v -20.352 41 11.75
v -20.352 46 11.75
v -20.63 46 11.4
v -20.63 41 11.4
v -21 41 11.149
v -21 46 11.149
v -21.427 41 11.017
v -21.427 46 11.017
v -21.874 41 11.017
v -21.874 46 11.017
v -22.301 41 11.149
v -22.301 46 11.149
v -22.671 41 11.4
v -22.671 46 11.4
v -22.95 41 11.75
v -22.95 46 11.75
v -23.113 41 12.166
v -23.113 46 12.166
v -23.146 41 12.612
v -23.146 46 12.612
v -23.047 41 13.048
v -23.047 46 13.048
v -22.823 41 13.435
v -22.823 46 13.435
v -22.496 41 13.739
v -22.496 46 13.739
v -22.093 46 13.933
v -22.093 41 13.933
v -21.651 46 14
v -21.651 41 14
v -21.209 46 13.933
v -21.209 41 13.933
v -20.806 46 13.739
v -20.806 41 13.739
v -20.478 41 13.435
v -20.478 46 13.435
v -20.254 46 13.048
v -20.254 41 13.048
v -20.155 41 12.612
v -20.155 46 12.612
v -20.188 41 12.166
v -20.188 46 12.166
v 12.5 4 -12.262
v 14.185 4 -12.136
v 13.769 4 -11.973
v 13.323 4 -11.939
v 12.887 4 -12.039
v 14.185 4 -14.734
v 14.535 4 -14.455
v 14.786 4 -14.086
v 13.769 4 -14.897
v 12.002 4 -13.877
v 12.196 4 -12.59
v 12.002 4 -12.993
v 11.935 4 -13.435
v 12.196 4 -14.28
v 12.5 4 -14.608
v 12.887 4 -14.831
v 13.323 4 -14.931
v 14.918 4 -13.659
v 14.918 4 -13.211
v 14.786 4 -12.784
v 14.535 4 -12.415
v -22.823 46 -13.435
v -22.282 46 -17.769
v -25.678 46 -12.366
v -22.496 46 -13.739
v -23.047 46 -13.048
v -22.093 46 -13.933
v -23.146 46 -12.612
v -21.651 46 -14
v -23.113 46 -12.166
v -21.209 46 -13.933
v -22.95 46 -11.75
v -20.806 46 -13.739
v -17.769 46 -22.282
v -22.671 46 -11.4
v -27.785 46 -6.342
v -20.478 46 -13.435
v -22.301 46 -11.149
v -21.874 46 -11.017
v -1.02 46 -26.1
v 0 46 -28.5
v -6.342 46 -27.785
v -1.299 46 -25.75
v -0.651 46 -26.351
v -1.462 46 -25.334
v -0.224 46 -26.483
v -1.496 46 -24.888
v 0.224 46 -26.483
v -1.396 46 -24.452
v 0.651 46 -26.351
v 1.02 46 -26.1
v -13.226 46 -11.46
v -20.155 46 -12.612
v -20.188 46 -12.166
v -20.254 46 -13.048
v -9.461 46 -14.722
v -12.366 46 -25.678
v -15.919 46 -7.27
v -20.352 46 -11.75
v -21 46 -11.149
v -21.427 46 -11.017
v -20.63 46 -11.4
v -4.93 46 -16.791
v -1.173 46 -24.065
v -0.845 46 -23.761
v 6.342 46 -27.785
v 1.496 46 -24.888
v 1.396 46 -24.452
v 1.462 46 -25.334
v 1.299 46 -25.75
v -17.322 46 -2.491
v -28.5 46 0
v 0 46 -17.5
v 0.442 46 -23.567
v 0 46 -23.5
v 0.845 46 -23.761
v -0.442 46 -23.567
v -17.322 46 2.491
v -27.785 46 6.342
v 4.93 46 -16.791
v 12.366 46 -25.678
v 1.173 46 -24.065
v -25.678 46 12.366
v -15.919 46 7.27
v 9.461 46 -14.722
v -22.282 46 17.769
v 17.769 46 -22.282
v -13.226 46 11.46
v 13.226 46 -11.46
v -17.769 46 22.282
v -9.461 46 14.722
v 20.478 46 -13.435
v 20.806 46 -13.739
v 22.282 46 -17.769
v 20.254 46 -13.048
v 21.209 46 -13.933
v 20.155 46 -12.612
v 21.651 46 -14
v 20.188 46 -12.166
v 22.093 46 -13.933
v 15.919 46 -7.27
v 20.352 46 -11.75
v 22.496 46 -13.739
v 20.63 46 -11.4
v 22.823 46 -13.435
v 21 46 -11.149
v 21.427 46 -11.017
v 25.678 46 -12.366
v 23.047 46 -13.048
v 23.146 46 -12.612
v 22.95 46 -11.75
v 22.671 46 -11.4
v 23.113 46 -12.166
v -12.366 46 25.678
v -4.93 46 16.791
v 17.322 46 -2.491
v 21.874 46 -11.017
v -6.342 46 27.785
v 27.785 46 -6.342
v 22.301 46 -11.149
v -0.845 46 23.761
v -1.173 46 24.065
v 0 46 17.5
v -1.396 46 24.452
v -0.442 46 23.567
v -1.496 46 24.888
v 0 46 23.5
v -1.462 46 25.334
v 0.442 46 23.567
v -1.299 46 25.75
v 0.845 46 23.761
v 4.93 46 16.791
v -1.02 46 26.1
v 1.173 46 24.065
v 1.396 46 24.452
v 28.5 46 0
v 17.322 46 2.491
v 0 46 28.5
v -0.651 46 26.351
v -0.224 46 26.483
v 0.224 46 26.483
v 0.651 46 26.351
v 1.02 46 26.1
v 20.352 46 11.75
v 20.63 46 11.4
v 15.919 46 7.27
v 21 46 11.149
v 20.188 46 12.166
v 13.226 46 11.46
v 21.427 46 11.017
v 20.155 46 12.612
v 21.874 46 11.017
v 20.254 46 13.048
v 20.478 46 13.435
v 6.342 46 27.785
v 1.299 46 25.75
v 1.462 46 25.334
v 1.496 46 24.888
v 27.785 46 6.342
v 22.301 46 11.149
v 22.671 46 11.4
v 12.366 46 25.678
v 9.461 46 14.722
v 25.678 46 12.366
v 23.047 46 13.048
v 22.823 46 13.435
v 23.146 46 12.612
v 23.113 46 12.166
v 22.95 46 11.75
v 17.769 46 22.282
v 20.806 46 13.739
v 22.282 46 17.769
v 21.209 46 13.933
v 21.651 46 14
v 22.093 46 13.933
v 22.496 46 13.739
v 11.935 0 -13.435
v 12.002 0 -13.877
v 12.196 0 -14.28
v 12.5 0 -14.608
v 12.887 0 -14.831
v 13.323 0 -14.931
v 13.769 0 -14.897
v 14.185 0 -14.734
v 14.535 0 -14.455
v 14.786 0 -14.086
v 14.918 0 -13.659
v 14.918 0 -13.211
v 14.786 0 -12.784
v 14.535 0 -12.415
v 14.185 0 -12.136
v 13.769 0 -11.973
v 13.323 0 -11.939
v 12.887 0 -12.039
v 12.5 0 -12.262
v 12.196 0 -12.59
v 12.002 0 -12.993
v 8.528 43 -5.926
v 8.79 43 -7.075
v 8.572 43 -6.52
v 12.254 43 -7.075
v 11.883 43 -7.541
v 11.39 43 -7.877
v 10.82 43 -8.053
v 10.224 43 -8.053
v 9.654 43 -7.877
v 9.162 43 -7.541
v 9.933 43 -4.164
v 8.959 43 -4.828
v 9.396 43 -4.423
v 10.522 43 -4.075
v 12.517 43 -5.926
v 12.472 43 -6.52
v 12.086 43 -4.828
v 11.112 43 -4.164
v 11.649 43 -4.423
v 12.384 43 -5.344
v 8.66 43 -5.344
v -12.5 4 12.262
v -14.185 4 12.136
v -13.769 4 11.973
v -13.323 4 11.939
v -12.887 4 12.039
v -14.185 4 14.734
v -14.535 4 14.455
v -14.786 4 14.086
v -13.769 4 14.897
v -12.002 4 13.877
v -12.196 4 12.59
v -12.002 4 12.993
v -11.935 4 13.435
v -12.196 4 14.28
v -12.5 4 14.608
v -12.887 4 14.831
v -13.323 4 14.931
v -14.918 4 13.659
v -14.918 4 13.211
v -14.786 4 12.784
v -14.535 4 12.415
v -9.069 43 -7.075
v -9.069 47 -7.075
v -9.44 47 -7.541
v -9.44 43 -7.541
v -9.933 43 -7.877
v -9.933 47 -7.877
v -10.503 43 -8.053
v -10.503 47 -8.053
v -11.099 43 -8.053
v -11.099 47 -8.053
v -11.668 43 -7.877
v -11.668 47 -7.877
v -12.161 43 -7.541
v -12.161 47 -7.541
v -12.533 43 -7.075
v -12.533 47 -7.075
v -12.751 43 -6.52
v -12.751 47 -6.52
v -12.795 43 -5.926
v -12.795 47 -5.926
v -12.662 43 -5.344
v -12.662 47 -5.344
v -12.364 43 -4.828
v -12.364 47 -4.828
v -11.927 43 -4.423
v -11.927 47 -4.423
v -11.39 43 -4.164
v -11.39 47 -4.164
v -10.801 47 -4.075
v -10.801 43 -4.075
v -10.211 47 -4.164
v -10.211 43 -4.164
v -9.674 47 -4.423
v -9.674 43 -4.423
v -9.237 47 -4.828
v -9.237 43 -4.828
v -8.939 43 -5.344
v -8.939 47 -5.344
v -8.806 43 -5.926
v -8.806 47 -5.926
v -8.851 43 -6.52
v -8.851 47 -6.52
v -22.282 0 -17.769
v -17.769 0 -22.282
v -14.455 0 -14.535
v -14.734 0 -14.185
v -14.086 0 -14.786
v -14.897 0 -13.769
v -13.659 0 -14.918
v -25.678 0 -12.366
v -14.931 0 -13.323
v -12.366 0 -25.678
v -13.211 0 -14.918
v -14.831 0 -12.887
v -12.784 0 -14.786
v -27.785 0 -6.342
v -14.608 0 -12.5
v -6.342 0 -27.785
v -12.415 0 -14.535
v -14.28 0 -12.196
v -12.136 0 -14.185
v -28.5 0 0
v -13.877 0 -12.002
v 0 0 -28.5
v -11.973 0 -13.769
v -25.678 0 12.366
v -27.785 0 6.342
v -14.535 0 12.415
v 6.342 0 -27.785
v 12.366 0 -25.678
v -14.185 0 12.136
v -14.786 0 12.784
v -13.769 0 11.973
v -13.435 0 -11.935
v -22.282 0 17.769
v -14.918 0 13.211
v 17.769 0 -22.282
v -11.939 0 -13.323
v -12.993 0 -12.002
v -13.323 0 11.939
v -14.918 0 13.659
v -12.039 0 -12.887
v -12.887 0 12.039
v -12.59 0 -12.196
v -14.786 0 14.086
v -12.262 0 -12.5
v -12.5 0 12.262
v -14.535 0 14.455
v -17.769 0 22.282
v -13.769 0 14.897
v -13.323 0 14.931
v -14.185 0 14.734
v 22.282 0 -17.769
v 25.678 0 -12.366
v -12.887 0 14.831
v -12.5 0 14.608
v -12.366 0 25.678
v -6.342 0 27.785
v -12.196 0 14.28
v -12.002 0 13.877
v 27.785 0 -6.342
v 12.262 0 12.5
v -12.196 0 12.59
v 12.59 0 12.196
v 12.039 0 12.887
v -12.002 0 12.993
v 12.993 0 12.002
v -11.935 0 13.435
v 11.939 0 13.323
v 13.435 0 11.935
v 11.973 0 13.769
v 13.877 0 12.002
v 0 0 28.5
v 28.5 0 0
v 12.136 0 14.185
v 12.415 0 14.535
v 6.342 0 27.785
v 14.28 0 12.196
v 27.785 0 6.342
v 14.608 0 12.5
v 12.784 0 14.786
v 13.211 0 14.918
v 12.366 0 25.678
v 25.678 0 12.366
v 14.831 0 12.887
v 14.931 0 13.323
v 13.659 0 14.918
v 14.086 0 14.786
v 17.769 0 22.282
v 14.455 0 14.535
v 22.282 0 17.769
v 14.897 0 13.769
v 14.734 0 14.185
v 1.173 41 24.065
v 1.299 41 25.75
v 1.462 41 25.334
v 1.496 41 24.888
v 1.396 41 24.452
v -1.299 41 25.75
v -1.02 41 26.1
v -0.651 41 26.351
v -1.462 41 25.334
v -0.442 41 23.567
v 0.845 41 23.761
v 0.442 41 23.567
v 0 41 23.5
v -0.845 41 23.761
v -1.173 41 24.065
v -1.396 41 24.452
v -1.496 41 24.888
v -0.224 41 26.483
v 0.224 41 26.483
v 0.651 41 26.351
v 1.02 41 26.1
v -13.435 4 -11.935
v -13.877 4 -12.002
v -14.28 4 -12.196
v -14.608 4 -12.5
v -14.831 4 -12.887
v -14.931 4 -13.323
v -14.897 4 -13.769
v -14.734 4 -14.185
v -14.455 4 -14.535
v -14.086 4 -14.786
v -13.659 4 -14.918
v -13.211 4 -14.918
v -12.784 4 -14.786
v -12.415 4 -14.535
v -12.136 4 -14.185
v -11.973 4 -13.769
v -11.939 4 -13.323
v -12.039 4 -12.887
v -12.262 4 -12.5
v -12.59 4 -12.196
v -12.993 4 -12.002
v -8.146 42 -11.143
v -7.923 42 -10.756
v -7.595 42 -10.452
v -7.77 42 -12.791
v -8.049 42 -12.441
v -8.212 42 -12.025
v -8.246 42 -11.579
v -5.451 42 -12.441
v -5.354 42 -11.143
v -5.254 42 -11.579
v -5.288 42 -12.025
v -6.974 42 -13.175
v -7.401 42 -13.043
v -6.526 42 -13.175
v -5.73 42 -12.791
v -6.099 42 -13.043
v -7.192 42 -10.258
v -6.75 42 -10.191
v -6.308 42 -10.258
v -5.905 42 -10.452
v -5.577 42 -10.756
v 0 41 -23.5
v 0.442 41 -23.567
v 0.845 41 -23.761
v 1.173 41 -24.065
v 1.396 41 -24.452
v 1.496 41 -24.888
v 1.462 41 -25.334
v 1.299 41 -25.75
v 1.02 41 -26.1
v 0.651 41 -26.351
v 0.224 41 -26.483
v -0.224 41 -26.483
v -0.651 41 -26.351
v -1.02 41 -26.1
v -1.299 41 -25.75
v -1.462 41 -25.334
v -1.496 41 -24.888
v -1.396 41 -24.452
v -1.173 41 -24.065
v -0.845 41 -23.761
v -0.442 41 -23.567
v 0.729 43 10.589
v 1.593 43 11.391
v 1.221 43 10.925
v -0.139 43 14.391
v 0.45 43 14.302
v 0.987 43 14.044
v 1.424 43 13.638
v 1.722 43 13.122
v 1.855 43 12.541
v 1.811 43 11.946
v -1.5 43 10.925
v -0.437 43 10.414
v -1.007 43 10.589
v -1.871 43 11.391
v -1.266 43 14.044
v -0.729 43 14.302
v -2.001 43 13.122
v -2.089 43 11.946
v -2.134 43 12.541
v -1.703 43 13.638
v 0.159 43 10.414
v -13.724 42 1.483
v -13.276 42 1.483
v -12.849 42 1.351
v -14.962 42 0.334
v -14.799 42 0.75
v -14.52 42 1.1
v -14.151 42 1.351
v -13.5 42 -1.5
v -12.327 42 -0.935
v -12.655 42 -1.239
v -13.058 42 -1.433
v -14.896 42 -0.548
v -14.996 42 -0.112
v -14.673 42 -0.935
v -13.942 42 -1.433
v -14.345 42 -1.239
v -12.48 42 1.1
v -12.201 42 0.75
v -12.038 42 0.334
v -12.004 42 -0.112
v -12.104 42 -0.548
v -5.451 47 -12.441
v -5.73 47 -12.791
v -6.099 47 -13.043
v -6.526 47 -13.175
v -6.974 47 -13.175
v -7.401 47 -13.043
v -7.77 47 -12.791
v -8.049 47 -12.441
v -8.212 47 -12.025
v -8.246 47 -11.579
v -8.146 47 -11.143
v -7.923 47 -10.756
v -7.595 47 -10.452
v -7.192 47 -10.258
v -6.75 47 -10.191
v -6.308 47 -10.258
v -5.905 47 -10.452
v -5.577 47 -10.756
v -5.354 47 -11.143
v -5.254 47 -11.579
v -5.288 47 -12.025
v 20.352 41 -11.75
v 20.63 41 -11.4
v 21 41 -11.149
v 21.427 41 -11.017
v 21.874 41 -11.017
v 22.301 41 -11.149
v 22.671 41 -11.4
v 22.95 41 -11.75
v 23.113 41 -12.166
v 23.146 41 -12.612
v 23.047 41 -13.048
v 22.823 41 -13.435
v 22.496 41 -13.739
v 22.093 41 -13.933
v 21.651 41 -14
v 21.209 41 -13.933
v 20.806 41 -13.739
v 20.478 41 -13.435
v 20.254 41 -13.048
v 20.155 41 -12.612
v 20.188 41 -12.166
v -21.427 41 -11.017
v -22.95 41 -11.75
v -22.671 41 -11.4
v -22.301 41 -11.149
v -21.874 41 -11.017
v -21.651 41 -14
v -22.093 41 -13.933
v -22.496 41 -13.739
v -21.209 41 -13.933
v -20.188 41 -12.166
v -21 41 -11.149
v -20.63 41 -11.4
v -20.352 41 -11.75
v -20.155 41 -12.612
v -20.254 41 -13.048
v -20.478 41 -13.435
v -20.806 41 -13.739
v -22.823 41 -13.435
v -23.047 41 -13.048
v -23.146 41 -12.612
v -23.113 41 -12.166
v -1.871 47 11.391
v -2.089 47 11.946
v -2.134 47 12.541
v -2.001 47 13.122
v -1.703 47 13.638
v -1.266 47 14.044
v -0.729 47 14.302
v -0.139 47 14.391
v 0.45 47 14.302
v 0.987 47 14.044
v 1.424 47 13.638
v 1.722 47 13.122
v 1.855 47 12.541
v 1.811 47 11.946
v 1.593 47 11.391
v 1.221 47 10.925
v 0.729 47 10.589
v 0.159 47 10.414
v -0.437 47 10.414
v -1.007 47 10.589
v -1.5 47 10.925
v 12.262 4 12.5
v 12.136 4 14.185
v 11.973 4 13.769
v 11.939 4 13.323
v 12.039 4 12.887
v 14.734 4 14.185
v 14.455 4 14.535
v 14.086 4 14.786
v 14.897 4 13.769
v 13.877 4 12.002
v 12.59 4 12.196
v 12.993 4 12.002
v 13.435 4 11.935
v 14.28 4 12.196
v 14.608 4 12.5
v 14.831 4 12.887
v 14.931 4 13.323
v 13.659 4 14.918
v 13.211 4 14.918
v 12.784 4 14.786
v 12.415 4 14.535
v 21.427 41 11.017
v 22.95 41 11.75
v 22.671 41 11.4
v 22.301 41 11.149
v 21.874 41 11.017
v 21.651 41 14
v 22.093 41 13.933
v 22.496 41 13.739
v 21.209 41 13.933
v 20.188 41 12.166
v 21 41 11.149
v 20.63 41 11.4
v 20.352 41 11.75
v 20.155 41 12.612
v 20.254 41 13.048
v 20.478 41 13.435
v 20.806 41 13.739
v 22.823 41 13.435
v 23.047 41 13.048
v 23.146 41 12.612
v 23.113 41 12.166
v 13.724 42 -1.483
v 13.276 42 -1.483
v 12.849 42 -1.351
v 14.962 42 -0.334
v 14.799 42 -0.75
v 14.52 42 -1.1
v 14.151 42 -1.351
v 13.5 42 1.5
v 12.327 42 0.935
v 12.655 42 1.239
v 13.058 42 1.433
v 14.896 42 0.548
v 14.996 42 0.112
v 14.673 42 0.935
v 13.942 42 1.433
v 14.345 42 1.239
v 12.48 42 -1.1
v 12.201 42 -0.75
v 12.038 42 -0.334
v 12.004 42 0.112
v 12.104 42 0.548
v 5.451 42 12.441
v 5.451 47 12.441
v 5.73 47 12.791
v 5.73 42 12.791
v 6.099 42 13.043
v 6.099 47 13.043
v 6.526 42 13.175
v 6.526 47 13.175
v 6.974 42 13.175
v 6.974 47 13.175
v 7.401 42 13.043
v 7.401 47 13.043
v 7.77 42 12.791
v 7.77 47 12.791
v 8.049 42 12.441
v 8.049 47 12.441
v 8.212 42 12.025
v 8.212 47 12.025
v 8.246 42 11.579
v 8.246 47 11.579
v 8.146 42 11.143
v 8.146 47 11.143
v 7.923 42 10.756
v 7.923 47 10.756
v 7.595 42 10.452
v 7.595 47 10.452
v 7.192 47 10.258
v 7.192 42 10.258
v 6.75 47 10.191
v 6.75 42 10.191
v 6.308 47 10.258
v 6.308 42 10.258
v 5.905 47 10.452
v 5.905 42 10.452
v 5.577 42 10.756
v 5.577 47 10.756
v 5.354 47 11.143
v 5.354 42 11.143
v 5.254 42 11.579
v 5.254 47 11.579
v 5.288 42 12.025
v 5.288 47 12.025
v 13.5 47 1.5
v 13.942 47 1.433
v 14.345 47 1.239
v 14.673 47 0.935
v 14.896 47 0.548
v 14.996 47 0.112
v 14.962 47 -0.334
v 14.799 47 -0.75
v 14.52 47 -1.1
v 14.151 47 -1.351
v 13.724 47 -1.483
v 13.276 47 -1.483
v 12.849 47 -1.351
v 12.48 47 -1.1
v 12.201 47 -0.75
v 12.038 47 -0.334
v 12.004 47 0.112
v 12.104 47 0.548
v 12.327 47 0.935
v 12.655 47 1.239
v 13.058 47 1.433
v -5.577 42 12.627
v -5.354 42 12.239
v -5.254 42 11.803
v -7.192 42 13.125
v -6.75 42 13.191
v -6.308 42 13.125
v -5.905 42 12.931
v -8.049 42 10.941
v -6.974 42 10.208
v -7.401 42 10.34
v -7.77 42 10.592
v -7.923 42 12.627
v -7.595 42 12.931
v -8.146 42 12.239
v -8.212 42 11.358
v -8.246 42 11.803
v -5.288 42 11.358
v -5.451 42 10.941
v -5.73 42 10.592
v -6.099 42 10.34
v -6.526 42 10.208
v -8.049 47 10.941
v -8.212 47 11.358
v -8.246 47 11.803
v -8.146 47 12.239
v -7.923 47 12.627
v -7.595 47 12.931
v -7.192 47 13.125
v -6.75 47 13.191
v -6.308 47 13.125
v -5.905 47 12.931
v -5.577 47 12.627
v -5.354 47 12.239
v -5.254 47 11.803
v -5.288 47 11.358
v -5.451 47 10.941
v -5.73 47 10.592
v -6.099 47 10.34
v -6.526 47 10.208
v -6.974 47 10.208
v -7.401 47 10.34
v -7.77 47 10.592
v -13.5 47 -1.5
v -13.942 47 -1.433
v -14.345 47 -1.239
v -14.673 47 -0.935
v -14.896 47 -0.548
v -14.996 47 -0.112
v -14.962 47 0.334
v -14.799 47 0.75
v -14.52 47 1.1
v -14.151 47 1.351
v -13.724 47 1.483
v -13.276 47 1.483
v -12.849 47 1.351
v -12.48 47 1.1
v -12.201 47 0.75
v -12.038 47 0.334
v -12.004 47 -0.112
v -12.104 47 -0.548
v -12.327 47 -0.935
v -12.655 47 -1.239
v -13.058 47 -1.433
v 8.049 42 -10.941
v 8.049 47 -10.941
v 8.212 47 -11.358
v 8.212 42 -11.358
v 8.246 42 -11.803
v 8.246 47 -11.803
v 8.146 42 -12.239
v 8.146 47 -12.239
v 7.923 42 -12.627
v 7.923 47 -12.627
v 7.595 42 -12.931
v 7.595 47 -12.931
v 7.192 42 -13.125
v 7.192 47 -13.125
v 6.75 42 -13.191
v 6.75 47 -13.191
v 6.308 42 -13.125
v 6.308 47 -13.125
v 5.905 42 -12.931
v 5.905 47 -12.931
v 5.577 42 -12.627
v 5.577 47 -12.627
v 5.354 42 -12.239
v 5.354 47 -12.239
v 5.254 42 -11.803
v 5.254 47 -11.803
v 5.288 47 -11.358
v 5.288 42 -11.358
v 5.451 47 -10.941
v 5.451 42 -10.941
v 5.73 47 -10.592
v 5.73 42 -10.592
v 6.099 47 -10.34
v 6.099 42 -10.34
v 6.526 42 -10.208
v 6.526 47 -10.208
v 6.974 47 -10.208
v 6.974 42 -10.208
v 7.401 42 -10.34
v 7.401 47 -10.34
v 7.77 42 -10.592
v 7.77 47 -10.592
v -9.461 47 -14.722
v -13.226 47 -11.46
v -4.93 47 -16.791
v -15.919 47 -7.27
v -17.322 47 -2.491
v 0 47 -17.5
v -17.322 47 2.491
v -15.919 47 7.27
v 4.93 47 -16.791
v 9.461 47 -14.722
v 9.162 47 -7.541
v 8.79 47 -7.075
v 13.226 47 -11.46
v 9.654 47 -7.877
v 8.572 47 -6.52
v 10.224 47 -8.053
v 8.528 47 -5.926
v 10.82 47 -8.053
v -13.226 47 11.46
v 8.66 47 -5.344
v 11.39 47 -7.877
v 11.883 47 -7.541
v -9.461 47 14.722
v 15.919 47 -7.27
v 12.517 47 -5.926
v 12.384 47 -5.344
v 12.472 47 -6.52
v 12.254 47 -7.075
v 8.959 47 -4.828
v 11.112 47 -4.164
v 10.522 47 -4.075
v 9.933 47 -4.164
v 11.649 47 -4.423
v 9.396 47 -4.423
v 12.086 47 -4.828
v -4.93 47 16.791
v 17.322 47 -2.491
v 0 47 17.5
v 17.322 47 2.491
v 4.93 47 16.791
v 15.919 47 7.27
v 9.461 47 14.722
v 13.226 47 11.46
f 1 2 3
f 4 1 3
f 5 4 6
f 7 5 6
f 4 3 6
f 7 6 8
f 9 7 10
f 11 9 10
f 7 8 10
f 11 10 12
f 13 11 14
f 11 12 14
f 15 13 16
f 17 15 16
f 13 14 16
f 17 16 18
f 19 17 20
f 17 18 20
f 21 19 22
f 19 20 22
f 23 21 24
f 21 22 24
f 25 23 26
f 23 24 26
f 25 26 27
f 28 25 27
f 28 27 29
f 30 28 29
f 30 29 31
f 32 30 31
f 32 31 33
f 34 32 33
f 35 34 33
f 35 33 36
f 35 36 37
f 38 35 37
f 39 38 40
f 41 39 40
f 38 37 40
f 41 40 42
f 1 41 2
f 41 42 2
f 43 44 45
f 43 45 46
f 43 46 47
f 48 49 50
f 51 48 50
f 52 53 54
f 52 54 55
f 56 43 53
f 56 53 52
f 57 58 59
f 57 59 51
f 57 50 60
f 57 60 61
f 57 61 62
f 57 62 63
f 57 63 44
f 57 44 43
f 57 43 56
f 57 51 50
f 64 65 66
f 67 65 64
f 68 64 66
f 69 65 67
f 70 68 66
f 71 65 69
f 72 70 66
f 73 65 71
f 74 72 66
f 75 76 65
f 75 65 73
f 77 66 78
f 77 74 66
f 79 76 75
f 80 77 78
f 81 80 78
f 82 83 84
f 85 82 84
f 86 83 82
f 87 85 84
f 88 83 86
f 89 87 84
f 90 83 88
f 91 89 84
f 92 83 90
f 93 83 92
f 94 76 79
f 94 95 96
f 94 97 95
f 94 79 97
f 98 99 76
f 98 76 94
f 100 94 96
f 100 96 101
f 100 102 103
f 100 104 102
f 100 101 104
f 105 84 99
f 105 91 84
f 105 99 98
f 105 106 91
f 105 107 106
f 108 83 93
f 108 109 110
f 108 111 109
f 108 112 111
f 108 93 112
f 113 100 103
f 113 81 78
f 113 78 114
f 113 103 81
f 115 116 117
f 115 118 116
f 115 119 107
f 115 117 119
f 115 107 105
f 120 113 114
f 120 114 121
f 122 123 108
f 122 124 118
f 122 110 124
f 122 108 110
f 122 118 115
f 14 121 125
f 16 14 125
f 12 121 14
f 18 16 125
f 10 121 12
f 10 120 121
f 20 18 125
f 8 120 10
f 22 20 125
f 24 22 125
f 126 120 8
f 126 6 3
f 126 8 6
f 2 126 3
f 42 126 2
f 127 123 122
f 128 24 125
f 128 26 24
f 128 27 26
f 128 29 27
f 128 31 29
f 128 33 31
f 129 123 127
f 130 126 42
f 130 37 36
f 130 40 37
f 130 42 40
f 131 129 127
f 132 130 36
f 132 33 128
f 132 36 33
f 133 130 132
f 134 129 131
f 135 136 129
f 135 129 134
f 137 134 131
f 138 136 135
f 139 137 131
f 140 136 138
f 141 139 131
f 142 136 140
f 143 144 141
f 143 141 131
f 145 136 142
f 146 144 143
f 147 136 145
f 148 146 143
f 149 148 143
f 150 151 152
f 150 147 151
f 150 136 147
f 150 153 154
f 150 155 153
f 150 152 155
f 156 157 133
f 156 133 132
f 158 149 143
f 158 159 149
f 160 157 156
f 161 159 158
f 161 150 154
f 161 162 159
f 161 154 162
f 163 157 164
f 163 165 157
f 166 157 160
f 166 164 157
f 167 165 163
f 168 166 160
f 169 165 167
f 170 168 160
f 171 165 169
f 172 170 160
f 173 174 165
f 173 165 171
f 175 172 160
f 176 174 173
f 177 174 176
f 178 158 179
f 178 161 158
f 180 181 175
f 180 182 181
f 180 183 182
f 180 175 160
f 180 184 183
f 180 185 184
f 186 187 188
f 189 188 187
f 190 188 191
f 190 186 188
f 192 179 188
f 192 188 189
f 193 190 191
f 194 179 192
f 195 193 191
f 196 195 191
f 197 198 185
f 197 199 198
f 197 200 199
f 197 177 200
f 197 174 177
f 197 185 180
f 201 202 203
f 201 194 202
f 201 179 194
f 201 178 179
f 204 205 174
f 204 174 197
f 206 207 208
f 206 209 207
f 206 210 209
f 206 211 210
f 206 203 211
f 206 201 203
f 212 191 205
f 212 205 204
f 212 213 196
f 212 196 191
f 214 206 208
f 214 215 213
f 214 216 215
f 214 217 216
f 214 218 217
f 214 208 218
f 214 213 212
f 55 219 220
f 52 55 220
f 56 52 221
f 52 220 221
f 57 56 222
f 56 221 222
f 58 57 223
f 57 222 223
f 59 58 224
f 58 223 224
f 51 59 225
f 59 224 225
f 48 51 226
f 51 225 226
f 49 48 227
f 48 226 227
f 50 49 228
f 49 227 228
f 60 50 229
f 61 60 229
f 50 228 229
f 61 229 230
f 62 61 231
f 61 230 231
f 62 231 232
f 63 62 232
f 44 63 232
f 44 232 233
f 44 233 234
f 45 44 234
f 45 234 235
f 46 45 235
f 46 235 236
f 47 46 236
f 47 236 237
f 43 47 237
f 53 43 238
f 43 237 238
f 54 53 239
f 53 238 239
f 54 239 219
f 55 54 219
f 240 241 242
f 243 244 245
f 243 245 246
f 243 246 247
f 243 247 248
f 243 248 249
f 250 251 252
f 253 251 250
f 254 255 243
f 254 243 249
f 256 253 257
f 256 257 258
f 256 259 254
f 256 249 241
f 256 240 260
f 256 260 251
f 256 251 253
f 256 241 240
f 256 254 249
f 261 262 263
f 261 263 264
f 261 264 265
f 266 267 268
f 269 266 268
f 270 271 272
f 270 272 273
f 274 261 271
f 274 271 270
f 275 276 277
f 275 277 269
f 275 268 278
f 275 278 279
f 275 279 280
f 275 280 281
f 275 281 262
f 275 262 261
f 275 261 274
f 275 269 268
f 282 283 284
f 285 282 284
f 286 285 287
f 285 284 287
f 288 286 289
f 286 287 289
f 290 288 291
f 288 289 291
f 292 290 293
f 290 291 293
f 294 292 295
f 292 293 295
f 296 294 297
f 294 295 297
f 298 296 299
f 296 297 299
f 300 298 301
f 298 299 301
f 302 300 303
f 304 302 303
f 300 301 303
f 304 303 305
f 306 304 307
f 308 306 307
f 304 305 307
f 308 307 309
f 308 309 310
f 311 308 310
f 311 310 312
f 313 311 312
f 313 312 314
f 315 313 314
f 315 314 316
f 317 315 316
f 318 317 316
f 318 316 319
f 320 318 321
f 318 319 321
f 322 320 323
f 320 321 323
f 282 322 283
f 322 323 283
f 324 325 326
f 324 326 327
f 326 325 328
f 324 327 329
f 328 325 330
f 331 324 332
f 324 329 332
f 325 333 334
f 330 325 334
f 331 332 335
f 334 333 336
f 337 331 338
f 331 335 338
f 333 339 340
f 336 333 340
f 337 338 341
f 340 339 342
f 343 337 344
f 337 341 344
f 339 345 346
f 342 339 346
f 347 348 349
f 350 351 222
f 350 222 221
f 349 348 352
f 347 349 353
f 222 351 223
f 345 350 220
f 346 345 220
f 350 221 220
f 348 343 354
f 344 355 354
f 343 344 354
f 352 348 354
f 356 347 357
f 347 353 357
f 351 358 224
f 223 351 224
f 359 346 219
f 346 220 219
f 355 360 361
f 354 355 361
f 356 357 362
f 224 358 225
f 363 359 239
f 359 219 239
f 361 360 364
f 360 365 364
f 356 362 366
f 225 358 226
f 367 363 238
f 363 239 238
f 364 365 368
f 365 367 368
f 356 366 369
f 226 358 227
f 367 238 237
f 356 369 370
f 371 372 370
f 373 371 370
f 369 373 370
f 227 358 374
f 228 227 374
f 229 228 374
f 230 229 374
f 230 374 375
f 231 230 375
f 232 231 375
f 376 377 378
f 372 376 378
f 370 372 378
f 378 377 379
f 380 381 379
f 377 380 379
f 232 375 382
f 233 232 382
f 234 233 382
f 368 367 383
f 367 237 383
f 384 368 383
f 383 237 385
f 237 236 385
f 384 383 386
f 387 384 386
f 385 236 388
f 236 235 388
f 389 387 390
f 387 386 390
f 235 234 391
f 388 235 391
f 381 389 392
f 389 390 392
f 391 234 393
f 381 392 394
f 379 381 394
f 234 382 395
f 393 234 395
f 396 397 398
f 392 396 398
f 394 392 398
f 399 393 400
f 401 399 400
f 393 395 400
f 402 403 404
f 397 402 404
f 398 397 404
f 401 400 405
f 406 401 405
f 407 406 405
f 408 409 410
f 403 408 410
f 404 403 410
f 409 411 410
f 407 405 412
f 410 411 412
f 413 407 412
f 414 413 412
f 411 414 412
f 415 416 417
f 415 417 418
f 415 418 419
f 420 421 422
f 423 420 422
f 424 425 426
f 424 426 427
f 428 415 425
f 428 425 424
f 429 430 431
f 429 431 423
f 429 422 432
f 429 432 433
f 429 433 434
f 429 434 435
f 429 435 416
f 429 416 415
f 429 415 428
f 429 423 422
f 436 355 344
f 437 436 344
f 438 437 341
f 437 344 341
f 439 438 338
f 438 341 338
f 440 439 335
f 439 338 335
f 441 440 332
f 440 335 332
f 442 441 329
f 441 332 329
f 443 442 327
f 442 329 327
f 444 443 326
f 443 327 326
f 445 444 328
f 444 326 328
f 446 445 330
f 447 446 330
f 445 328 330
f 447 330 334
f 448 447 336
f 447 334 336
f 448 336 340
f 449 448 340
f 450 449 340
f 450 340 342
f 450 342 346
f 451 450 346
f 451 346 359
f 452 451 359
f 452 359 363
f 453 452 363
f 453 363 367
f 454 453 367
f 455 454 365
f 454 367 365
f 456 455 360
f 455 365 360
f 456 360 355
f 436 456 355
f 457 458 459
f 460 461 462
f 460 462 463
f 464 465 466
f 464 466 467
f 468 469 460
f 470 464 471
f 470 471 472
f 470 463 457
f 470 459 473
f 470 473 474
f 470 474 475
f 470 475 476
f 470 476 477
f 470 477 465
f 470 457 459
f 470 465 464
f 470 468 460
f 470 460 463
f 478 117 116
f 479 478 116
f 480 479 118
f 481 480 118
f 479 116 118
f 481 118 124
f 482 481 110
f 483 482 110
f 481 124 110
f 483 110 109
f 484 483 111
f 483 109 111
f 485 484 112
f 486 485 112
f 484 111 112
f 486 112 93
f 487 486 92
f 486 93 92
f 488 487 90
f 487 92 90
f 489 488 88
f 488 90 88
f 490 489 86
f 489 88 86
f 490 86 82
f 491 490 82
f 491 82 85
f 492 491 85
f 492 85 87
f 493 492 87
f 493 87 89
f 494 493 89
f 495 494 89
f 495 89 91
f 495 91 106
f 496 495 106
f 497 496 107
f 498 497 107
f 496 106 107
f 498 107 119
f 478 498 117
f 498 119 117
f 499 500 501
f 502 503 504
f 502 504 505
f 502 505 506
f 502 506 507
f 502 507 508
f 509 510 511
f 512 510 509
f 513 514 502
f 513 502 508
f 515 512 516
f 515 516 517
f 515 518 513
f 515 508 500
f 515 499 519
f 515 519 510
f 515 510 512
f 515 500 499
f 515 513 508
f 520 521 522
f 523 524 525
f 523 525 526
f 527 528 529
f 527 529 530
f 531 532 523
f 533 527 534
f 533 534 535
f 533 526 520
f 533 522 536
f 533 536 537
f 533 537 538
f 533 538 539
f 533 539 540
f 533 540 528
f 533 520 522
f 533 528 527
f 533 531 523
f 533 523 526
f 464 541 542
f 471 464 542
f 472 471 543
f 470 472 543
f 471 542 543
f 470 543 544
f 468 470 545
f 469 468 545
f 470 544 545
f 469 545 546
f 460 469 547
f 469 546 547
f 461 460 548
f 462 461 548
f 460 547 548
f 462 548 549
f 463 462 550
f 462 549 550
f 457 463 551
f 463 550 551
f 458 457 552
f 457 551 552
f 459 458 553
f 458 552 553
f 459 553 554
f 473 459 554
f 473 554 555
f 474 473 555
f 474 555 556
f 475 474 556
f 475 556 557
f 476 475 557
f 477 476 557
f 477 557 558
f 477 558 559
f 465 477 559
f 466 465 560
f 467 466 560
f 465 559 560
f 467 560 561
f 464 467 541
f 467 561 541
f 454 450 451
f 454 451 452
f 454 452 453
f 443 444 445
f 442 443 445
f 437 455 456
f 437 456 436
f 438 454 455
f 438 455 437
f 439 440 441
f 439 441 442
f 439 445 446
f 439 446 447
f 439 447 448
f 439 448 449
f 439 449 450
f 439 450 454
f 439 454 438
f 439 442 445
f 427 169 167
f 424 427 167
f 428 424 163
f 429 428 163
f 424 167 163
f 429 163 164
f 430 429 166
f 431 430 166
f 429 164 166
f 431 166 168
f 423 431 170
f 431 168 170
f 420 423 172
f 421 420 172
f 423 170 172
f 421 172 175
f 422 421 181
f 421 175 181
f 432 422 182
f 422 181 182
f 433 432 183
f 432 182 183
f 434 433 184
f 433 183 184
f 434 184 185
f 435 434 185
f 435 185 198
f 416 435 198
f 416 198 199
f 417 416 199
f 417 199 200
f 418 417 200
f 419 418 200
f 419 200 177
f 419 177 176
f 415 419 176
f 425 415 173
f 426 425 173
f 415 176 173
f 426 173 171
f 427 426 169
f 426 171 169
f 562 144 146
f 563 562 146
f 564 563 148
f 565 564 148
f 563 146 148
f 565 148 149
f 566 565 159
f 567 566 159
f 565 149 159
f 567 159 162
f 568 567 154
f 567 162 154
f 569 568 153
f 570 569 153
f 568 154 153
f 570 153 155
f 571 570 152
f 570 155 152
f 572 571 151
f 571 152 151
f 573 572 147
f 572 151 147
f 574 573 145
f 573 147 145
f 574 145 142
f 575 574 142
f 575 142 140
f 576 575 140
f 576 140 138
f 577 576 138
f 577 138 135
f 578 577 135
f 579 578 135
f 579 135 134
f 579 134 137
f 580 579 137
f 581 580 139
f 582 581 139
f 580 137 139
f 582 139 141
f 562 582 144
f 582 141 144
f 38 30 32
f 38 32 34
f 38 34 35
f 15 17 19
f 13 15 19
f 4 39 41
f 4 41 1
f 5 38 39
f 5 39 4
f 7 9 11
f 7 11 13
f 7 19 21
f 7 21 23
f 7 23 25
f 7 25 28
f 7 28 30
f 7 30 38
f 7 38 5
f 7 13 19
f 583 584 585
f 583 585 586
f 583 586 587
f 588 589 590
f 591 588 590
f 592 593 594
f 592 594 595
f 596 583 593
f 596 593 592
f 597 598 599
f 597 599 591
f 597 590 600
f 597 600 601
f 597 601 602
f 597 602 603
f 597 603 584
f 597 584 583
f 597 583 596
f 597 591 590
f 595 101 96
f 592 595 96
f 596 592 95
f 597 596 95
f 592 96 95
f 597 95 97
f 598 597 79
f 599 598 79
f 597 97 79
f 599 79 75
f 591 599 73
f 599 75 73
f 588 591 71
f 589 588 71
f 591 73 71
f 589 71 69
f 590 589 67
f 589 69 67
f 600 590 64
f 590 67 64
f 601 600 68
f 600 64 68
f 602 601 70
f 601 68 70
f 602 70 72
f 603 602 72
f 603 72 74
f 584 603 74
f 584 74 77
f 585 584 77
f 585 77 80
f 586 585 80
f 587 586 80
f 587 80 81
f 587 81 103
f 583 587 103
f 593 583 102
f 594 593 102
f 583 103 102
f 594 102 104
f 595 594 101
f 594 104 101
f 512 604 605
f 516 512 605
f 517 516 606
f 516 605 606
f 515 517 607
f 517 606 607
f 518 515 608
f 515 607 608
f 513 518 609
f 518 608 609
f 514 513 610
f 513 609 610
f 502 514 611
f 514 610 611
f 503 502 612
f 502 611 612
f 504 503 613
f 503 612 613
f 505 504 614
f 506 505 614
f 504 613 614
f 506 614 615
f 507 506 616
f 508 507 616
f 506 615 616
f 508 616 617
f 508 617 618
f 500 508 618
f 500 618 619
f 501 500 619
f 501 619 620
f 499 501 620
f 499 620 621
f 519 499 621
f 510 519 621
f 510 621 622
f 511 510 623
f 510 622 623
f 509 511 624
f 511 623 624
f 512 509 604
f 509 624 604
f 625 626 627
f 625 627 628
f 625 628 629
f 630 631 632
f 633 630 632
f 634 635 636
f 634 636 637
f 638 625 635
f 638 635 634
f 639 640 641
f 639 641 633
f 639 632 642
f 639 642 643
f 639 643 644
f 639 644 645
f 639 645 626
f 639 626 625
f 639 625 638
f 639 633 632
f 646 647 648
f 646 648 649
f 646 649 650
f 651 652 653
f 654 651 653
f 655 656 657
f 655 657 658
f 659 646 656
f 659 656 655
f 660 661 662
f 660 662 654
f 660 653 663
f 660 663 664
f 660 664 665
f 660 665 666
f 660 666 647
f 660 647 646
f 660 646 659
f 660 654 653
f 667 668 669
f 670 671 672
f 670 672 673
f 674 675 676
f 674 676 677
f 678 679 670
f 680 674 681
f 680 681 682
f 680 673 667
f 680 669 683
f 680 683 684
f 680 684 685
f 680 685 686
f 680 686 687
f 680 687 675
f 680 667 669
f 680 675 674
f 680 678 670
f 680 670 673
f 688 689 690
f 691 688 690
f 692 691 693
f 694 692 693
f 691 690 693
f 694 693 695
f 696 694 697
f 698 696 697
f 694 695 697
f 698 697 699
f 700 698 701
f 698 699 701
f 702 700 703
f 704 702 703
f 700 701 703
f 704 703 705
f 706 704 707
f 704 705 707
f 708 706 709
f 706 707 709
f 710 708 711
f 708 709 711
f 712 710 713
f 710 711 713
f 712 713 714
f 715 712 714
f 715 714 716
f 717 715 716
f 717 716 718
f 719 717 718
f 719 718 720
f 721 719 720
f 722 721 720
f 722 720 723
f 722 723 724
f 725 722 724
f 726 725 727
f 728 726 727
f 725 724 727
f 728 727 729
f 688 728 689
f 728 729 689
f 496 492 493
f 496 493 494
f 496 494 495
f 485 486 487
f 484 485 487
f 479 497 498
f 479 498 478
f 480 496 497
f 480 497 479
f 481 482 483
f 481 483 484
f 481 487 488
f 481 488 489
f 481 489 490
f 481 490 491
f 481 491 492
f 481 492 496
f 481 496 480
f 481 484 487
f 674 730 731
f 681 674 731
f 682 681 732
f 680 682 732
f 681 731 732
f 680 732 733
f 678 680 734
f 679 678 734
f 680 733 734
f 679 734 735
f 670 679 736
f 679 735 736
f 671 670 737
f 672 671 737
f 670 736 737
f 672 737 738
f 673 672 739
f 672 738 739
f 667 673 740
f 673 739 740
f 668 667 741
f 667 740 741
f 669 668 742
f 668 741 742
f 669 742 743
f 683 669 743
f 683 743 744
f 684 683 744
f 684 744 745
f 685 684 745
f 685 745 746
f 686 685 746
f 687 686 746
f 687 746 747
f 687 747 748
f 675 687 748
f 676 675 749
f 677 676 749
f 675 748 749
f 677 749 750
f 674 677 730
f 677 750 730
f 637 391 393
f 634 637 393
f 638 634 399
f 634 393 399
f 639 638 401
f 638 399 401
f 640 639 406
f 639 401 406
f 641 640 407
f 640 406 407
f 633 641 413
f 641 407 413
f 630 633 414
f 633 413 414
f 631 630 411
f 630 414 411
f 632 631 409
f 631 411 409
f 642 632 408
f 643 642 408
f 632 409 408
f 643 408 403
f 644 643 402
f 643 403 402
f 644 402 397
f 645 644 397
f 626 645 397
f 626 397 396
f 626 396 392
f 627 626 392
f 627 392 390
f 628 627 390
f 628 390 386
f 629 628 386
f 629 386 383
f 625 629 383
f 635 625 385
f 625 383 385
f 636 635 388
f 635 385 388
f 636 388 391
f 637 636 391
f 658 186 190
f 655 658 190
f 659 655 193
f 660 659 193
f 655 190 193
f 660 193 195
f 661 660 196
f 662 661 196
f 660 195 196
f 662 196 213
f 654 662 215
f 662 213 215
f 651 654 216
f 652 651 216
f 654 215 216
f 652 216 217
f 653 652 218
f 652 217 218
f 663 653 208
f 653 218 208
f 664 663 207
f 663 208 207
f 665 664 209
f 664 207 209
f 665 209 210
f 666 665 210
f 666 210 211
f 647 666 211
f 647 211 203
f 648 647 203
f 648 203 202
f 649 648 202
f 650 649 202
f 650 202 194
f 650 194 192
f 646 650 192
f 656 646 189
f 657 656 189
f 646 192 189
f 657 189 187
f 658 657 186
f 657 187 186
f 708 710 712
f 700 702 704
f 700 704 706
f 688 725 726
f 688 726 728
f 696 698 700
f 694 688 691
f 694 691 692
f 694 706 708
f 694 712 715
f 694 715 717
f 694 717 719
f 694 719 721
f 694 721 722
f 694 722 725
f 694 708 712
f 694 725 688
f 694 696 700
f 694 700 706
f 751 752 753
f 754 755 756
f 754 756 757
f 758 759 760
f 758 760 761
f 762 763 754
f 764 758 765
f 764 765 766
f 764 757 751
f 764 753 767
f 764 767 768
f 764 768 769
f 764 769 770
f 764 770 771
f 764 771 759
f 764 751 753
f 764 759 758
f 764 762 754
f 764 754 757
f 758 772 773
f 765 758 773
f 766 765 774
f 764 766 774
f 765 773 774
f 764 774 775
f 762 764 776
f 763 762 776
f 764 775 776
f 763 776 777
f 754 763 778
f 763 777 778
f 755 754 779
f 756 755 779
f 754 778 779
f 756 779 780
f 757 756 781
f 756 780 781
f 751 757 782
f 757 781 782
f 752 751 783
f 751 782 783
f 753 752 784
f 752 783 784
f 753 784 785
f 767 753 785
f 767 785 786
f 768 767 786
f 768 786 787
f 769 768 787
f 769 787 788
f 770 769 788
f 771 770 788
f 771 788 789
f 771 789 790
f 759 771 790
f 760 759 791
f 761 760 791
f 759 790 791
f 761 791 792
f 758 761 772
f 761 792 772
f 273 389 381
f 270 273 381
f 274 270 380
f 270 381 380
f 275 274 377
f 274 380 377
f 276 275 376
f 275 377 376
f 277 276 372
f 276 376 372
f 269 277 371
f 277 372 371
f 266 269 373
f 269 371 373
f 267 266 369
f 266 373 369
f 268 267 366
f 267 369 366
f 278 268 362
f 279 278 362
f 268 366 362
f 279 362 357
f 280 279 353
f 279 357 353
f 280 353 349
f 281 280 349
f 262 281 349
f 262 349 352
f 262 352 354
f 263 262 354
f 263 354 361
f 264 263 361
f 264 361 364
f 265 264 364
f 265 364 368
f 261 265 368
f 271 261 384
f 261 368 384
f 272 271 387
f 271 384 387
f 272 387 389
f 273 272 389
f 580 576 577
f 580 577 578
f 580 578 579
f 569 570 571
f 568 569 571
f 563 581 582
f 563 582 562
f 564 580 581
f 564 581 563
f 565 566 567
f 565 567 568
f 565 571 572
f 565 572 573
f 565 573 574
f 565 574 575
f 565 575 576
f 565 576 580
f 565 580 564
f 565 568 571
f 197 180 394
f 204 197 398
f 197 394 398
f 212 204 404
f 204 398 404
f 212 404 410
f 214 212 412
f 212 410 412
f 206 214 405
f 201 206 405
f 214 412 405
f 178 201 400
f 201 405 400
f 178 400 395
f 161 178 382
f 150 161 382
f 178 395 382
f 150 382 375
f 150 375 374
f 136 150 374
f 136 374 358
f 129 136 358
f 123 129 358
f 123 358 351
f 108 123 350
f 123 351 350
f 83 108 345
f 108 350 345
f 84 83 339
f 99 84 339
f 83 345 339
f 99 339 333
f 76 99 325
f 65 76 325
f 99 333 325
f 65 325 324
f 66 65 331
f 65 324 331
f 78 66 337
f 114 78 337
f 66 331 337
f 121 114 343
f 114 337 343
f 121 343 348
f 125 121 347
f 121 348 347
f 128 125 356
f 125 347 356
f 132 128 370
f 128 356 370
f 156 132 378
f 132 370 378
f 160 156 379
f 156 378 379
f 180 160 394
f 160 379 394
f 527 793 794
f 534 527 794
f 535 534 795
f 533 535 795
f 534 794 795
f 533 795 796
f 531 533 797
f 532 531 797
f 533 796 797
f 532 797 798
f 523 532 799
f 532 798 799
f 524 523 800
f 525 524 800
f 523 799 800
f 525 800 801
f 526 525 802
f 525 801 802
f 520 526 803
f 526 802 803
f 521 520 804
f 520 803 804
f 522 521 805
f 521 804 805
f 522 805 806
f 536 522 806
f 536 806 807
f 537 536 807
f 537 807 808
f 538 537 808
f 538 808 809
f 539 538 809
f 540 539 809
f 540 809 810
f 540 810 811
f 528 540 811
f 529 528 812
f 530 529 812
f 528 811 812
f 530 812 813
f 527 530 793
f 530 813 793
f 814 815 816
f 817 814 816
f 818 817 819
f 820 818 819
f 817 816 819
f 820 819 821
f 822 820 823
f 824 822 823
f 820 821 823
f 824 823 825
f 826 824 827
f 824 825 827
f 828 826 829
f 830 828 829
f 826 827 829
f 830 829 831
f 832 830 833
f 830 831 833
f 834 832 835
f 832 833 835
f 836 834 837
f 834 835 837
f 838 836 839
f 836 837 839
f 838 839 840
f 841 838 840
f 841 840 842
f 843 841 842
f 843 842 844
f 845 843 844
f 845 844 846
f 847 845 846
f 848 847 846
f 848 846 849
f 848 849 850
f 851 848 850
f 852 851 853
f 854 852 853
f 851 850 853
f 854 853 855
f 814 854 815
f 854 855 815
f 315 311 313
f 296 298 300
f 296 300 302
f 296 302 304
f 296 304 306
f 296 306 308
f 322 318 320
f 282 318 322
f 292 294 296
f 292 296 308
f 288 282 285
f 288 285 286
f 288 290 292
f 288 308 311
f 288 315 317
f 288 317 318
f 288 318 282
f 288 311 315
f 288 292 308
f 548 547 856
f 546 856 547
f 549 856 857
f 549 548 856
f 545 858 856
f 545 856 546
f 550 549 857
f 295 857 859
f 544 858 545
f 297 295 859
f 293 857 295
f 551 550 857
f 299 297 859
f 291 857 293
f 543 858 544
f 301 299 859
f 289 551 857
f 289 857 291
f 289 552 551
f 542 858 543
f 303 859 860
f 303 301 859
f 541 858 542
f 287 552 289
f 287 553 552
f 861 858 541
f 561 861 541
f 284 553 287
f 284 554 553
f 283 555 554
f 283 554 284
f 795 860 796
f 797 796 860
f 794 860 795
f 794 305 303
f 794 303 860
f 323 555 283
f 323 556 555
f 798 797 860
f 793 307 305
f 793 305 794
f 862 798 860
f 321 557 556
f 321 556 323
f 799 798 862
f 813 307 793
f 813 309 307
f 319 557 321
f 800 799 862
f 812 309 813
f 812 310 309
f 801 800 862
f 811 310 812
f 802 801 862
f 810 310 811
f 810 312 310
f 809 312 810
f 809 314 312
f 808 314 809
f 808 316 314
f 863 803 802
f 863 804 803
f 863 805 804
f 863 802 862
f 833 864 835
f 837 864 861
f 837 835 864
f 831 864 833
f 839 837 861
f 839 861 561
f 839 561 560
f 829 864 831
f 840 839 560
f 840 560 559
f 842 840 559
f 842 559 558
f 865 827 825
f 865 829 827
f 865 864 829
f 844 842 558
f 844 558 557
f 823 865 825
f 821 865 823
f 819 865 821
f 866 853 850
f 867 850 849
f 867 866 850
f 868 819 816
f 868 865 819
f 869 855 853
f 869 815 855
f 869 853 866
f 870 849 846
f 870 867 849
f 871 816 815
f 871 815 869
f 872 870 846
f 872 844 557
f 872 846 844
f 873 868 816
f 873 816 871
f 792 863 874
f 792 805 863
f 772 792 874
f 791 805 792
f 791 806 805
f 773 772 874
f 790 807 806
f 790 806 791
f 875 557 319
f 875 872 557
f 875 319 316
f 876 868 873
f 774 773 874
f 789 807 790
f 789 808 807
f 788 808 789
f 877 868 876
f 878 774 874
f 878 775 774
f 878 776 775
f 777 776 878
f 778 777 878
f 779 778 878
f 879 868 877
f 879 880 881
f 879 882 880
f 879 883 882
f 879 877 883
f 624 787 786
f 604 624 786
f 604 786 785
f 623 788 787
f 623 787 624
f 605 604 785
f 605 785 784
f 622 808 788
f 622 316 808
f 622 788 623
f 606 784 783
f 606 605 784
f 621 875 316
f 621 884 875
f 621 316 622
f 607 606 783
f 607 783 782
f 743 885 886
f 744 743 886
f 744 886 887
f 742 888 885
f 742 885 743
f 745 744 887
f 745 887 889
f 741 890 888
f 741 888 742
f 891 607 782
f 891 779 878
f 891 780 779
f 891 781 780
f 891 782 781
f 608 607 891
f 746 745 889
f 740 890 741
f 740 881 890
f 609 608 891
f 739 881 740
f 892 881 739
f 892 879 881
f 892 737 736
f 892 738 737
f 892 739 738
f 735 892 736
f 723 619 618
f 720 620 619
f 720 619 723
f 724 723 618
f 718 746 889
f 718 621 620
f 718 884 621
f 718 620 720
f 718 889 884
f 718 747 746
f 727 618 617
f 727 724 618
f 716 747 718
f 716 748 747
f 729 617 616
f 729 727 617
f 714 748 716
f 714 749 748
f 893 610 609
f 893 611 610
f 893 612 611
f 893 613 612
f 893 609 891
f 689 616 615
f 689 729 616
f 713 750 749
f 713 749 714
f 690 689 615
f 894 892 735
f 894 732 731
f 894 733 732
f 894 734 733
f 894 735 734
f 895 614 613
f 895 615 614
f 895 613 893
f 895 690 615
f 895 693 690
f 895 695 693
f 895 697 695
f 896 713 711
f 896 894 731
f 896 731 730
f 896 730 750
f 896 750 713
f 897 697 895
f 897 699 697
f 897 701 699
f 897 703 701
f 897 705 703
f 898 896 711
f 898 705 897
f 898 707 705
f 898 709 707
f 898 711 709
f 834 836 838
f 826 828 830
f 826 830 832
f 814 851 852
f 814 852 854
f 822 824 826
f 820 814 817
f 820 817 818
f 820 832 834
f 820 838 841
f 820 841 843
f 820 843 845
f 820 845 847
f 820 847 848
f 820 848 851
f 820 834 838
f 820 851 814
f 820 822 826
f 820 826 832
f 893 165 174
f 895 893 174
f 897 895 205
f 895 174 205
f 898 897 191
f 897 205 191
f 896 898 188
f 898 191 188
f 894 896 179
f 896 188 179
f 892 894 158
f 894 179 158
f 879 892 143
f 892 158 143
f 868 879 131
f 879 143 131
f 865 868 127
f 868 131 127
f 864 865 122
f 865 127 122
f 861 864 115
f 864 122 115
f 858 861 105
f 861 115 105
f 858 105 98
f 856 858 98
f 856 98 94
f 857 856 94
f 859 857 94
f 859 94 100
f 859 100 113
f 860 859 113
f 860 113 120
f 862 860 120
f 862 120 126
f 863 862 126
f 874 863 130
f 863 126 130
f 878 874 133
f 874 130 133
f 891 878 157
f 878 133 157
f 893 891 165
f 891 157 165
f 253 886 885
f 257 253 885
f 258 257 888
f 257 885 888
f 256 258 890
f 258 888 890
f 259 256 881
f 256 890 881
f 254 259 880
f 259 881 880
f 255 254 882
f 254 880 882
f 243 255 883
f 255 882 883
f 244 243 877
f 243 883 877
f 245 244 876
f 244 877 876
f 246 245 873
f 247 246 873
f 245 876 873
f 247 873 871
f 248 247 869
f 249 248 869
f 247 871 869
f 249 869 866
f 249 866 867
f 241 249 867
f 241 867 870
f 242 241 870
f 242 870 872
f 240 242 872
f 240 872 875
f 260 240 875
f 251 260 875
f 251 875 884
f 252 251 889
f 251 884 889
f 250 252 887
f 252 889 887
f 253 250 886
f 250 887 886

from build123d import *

# Parameters (mm, degrees)
SKETCH_1_R               = 28.5
EXTRUDE_1_DEPTH          = 46
SKETCH_2_R               = 17.5
EXTRUDE_2_DEPTH          = 1
SKETCH_4_R               = 1.5
CUT_EXTRUDE_1_DEPTH      = 4
PATTERN_CIRCULAR_1_COUNT = 4
SKETCH_5_R               = 2
CUT_EXTRUDE_2_DEPTH      = 4
PATTERN_CIRCULAR_2_COUNT = 3
SKETCH_6_R               = 1.5
CUT_EXTRUDE_3_DEPTH      = 5
PATTERN_CIRCULAR_3_COUNT = 6
SKETCH_8_R               = 1.5
CUT_EXTRUDE_4_DEPTH      = 5
PATTERN_CIRCULAR_4_COUNT = 6


with BuildPart() as part:
    # 草图1 → 凸台-拉伸1 (new body)
    with BuildSketch(Plane(origin=(0, 0, 0), x_dir=(1, 0, 0), z_dir=(0, 1, 0))):
        with Locations(Location((0, 0, 0), (0, 0, 270))):
            Circle(SKETCH_1_R)
    extrude(amount=EXTRUDE_1_DEPTH)

    # 草图2 → 凸台-拉伸2 (add)
    with BuildSketch(Plane(origin=(0, 46, 0), x_dir=(1, 0, 0), z_dir=(0, 1, 0))):
        with Locations(Location((0, 0, 0), (0, 0, 270))):
            Circle(SKETCH_2_R)
    extrude(amount=EXTRUDE_2_DEPTH)

    # 草图4 → 切除-拉伸1 (cut)
    with BuildSketch(Plane.XZ):
        with Locations(Location((13.435028843, 13.435028843, 0), (0, 0, 270))):
            Circle(SKETCH_4_R)
    cut_extrude_1 = extrude(amount=-CUT_EXTRUDE_1_DEPTH, mode=Mode.SUBTRACT)

    # 阵列(圆周)1: 切除-拉伸1 ×4 about axis
    pattern_circular_1_axis = Axis((0, 0, 0), (0, 1, 0))
    for i in range(1, PATTERN_CIRCULAR_1_COUNT):
        add(cut_extrude_1.rotate(pattern_circular_1_axis, i * 360 / PATTERN_CIRCULAR_1_COUNT), mode=Mode.SUBTRACT)

    # 草图5 → 切除-拉伸2 (cut)
    with BuildSketch(Plane(origin=(0, 47, 0), x_dir=(1, 0, 0), z_dir=(0, 1, 0))):
        with Locations(Location((10.522208656, 6.075, 0), (0, 0, 270))):
            Circle(SKETCH_5_R)
    cut_extrude_2 = extrude(amount=-CUT_EXTRUDE_2_DEPTH, mode=Mode.SUBTRACT)

    # 阵列(圆周)2: 切除-拉伸2 ×3 about axis
    pattern_circular_2_axis = Axis((-0.139251727, 0, 0.080397022), (0, 1, 0))
    for i in range(1, PATTERN_CIRCULAR_2_COUNT):
        add(cut_extrude_2.rotate(pattern_circular_2_axis, i * 360 / PATTERN_CIRCULAR_2_COUNT), mode=Mode.SUBTRACT)

    # 草图6 → 切除-拉伸3 (cut)
    with BuildSketch(Plane(origin=(0, 47, 0), x_dir=(1, 0, 0), z_dir=(0, 1, 0))):
        with Locations(Location((13.5, 0, 0), (0, 0, 270))):
            Circle(SKETCH_6_R)
    cut_extrude_3 = extrude(amount=-CUT_EXTRUDE_3_DEPTH, mode=Mode.SUBTRACT)

    # 阵列(圆周)3: 切除-拉伸3 ×6 about axis
    pattern_circular_3_axis = Axis((0, 0, 0), (0, 1, 0))
    for i in range(1, PATTERN_CIRCULAR_3_COUNT):
        add(cut_extrude_3.rotate(pattern_circular_3_axis, i * 360 / PATTERN_CIRCULAR_3_COUNT), mode=Mode.SUBTRACT)

    # 草图8 → 切除-拉伸4 (cut)
    with BuildSketch(Plane(origin=(0, 46, 0), x_dir=(1, 0, 0), z_dir=(0, 1, 0))):
        with Locations(Location((0, 25, 0), (0, 0, 270))):
            Circle(SKETCH_8_R)
    cut_extrude_4 = extrude(amount=-CUT_EXTRUDE_4_DEPTH, mode=Mode.SUBTRACT)

    # 阵列(圆周)4: 切除-拉伸4 ×6 about axis
    pattern_circular_4_axis = Axis((0, 0, 0), (0, 1, 0))
    for i in range(1, PATTERN_CIRCULAR_4_COUNT):
        add(cut_extrude_4.rotate(pattern_circular_4_axis, i * 360 / PATTERN_CIRCULAR_4_COUNT), mode=Mode.SUBTRACT)


solid = part.part
